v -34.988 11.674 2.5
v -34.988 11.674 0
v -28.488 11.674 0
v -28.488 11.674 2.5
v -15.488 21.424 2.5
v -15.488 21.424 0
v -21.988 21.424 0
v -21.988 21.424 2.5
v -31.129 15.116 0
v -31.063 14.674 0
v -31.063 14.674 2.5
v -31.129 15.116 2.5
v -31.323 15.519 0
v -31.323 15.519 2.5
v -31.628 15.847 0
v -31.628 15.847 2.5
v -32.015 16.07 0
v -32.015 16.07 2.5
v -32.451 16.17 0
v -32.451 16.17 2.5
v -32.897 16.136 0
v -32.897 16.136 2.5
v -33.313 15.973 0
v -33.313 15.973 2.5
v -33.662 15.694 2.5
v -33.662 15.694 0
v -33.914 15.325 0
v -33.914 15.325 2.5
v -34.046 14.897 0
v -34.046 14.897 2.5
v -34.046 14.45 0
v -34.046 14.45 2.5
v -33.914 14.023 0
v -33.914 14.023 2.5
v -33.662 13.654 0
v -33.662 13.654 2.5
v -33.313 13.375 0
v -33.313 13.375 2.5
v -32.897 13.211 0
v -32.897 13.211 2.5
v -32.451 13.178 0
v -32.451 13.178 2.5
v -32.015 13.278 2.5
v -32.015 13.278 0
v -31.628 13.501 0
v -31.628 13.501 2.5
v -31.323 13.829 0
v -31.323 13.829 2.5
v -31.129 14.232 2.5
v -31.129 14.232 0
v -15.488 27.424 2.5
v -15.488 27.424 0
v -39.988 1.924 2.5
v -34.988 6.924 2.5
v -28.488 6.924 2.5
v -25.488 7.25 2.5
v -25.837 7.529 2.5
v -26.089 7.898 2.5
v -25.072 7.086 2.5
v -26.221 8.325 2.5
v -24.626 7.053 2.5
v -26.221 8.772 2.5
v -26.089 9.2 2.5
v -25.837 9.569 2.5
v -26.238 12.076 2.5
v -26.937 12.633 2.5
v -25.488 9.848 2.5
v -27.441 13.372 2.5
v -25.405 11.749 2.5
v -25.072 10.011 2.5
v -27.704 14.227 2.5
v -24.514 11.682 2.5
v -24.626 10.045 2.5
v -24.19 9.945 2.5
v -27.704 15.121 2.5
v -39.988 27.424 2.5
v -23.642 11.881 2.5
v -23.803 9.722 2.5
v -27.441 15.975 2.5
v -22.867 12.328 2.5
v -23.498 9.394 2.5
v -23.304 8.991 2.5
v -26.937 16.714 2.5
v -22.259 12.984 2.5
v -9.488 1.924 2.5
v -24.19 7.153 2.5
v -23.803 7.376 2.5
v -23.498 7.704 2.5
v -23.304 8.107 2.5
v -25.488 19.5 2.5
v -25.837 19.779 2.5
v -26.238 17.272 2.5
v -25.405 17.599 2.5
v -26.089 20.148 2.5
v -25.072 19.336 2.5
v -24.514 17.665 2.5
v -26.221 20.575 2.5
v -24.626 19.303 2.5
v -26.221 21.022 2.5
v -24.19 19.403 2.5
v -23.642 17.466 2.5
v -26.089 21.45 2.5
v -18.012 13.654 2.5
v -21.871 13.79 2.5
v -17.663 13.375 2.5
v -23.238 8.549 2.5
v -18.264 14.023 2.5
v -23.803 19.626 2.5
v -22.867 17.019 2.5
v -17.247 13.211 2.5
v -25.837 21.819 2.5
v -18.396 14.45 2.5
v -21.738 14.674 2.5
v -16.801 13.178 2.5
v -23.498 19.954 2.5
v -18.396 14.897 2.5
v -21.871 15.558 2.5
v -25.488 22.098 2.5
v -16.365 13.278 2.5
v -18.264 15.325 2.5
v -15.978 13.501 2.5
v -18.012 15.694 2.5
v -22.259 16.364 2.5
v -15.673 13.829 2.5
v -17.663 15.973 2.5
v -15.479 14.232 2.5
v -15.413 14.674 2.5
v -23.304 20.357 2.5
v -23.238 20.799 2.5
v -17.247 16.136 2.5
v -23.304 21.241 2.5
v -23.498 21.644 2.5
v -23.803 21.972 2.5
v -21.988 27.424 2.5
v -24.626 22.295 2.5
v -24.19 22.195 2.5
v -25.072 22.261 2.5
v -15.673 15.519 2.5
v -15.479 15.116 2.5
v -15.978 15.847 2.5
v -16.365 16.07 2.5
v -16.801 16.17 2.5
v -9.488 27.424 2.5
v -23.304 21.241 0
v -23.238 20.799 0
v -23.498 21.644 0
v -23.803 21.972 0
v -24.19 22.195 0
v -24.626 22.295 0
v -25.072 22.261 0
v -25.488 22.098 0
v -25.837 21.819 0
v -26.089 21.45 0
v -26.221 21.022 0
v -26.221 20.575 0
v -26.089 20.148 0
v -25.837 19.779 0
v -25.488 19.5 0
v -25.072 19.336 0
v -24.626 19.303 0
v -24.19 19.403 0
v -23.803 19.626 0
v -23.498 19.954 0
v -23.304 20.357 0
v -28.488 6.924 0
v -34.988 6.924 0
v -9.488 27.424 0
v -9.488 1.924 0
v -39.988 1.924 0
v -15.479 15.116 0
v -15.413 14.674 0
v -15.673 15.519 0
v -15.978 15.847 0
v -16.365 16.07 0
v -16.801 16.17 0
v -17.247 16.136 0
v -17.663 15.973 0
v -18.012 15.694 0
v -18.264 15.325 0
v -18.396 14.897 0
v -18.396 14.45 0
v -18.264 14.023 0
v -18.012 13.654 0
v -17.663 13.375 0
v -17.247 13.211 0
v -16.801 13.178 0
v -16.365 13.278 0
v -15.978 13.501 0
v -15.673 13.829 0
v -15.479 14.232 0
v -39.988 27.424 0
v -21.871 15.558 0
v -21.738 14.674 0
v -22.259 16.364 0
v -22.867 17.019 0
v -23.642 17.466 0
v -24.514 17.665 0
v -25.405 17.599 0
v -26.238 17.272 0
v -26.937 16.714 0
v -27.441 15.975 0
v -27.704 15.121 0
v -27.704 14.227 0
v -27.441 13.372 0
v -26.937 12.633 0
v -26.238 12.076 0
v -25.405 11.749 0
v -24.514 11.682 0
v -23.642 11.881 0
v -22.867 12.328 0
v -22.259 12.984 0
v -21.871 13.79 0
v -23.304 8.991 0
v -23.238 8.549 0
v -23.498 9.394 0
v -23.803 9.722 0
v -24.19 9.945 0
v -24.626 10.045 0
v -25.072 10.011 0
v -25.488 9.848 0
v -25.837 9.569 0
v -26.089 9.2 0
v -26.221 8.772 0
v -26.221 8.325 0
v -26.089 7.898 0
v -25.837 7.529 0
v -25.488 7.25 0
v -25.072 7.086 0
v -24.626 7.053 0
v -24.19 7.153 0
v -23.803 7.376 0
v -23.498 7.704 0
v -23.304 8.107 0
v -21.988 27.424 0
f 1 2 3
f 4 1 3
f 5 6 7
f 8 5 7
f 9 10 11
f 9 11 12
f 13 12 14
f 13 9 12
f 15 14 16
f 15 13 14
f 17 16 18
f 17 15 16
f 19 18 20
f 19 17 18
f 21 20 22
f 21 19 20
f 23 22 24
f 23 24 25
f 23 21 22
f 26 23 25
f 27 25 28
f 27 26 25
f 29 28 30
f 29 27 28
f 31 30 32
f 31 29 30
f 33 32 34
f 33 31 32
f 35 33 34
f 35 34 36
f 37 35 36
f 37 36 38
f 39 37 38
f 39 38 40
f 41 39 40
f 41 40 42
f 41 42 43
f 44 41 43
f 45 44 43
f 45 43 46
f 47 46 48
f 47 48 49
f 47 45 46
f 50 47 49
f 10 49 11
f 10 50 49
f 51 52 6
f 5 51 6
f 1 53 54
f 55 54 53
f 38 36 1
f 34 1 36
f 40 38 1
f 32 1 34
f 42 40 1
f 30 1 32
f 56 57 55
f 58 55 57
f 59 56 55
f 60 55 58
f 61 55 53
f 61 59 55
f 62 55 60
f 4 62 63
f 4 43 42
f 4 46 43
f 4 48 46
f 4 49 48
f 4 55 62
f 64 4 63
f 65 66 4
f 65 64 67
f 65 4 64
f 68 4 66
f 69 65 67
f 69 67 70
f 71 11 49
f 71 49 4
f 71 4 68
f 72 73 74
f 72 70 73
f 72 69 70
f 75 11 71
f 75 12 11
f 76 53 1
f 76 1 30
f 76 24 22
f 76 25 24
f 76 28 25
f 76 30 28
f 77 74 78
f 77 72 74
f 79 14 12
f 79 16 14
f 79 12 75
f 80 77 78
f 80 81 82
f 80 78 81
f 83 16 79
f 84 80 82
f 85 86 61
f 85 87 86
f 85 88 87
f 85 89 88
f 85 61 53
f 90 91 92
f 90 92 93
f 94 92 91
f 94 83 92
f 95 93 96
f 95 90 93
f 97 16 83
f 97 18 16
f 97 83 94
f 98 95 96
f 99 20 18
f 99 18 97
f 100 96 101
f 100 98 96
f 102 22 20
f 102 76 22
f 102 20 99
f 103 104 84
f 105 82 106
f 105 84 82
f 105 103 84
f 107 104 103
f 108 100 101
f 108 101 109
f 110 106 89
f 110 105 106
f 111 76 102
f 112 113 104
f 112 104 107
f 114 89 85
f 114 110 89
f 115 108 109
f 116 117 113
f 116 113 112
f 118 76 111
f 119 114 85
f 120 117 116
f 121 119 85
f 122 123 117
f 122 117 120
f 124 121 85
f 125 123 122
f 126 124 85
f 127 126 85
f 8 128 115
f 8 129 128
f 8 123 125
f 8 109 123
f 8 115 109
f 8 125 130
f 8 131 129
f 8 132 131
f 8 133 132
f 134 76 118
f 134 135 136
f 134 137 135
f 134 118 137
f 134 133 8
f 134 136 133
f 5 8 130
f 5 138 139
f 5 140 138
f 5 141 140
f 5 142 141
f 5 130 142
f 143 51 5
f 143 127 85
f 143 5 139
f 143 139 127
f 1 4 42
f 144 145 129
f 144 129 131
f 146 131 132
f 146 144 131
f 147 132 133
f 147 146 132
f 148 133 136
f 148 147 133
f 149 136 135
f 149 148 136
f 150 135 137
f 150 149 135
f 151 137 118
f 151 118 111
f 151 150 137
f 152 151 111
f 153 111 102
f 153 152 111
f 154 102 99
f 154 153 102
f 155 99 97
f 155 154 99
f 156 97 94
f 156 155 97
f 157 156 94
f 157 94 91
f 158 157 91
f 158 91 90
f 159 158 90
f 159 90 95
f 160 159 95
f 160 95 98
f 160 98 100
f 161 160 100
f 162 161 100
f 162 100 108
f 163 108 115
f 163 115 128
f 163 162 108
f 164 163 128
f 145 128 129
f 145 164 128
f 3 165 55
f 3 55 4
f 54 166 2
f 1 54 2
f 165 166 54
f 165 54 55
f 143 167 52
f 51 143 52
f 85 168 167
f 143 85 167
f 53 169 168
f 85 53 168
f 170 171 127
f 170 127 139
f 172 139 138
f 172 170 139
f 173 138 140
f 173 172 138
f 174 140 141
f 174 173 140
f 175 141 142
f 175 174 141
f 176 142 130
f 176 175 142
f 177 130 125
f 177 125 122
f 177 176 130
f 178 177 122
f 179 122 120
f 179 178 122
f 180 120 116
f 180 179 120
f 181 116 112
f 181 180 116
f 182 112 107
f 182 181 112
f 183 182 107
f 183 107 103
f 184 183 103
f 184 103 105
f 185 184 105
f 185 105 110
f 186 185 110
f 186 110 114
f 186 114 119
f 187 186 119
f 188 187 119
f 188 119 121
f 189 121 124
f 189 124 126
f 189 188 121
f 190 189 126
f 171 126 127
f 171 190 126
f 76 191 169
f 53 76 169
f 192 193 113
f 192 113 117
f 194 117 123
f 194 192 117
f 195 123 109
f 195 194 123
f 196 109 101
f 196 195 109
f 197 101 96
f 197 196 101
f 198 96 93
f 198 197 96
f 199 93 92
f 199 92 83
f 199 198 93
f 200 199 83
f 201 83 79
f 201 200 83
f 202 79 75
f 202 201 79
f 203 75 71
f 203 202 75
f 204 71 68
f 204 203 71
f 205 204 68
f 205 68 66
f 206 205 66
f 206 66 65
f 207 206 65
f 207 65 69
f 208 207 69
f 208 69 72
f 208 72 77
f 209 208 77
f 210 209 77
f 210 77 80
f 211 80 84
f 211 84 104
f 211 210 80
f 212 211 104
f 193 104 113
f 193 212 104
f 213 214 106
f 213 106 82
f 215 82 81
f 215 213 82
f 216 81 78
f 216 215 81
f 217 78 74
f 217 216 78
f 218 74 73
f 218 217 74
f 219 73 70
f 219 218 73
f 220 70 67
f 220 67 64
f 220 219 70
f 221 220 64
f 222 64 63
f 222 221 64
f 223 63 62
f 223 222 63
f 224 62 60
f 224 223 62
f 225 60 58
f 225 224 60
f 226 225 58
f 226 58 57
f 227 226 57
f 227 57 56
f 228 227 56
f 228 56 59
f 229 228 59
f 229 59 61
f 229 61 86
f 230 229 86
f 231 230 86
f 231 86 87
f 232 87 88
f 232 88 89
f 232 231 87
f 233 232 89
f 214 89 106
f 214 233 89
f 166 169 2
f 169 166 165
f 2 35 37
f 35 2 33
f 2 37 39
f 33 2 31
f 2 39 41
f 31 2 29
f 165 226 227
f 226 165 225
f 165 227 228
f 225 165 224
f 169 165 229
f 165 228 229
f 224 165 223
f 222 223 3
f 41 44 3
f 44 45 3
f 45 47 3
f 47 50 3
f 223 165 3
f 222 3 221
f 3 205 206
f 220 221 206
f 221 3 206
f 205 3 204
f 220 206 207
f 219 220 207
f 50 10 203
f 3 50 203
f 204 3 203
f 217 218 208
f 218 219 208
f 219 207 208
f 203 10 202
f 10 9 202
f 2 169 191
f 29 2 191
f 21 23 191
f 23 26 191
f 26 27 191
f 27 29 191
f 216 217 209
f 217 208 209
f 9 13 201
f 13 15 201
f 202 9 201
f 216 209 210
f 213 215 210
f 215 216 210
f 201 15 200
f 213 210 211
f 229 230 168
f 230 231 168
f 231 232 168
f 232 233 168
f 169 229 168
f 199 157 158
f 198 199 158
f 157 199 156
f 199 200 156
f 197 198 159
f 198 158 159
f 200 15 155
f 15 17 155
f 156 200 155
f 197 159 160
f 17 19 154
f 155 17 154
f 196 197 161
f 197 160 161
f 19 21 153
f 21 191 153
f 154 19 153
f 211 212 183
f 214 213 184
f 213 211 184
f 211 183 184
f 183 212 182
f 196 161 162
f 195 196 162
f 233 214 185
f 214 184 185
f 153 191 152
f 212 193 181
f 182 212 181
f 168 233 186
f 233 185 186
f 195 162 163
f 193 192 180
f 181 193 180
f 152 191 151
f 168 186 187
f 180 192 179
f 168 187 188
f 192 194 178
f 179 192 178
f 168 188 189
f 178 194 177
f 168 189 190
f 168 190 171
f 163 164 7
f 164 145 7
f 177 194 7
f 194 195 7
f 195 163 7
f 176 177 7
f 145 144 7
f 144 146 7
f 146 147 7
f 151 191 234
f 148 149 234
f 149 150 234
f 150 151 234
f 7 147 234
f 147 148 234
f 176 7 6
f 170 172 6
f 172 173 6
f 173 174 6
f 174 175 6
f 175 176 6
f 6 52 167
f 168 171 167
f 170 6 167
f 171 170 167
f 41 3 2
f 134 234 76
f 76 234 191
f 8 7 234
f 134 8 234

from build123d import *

# Parameters (mm, degrees)
F0_W     = 6.5
F0_H     = 4.75
F0_R     = 1.5
F0_R_2   = 3
F1_DEPTH = 2.5


with BuildPart() as f1:
    # F0 (on Top) → F1 (new body)
    with BuildSketch(Plane.XY):
        Polygon((-39.987817, 27.423815), (-39.987817, 1.923815), (-9.487817, 1.923815), (-9.487817, 27.423815), (-15.487817, 27.423815), (-15.487817, 21.423815), (-21.987817, 21.423815), (-21.987817, 27.423815), align=None)
        with Locations((-31.737817, 9.298815)):
            Rectangle(F0_W, F0_H, mode=Mode.SUBTRACT)
        with Locations((-24.737817, 8.548815)):
            Circle(F0_R, mode=Mode.SUBTRACT)
        with Locations((-32.562817, 14.673815)):
            Circle(F0_R, mode=Mode.SUBTRACT)
        with Locations((-24.737817, 14.673815)):
            Circle(F0_R_2, mode=Mode.SUBTRACT)
        with Locations((-24.737817, 20.798815)):
            Circle(F0_R, mode=Mode.SUBTRACT)
        with Locations((-16.912817, 14.673815)):
            Circle(F0_R, mode=Mode.SUBTRACT)
    extrude(amount=F1_DEPTH)


solid = f1.part
